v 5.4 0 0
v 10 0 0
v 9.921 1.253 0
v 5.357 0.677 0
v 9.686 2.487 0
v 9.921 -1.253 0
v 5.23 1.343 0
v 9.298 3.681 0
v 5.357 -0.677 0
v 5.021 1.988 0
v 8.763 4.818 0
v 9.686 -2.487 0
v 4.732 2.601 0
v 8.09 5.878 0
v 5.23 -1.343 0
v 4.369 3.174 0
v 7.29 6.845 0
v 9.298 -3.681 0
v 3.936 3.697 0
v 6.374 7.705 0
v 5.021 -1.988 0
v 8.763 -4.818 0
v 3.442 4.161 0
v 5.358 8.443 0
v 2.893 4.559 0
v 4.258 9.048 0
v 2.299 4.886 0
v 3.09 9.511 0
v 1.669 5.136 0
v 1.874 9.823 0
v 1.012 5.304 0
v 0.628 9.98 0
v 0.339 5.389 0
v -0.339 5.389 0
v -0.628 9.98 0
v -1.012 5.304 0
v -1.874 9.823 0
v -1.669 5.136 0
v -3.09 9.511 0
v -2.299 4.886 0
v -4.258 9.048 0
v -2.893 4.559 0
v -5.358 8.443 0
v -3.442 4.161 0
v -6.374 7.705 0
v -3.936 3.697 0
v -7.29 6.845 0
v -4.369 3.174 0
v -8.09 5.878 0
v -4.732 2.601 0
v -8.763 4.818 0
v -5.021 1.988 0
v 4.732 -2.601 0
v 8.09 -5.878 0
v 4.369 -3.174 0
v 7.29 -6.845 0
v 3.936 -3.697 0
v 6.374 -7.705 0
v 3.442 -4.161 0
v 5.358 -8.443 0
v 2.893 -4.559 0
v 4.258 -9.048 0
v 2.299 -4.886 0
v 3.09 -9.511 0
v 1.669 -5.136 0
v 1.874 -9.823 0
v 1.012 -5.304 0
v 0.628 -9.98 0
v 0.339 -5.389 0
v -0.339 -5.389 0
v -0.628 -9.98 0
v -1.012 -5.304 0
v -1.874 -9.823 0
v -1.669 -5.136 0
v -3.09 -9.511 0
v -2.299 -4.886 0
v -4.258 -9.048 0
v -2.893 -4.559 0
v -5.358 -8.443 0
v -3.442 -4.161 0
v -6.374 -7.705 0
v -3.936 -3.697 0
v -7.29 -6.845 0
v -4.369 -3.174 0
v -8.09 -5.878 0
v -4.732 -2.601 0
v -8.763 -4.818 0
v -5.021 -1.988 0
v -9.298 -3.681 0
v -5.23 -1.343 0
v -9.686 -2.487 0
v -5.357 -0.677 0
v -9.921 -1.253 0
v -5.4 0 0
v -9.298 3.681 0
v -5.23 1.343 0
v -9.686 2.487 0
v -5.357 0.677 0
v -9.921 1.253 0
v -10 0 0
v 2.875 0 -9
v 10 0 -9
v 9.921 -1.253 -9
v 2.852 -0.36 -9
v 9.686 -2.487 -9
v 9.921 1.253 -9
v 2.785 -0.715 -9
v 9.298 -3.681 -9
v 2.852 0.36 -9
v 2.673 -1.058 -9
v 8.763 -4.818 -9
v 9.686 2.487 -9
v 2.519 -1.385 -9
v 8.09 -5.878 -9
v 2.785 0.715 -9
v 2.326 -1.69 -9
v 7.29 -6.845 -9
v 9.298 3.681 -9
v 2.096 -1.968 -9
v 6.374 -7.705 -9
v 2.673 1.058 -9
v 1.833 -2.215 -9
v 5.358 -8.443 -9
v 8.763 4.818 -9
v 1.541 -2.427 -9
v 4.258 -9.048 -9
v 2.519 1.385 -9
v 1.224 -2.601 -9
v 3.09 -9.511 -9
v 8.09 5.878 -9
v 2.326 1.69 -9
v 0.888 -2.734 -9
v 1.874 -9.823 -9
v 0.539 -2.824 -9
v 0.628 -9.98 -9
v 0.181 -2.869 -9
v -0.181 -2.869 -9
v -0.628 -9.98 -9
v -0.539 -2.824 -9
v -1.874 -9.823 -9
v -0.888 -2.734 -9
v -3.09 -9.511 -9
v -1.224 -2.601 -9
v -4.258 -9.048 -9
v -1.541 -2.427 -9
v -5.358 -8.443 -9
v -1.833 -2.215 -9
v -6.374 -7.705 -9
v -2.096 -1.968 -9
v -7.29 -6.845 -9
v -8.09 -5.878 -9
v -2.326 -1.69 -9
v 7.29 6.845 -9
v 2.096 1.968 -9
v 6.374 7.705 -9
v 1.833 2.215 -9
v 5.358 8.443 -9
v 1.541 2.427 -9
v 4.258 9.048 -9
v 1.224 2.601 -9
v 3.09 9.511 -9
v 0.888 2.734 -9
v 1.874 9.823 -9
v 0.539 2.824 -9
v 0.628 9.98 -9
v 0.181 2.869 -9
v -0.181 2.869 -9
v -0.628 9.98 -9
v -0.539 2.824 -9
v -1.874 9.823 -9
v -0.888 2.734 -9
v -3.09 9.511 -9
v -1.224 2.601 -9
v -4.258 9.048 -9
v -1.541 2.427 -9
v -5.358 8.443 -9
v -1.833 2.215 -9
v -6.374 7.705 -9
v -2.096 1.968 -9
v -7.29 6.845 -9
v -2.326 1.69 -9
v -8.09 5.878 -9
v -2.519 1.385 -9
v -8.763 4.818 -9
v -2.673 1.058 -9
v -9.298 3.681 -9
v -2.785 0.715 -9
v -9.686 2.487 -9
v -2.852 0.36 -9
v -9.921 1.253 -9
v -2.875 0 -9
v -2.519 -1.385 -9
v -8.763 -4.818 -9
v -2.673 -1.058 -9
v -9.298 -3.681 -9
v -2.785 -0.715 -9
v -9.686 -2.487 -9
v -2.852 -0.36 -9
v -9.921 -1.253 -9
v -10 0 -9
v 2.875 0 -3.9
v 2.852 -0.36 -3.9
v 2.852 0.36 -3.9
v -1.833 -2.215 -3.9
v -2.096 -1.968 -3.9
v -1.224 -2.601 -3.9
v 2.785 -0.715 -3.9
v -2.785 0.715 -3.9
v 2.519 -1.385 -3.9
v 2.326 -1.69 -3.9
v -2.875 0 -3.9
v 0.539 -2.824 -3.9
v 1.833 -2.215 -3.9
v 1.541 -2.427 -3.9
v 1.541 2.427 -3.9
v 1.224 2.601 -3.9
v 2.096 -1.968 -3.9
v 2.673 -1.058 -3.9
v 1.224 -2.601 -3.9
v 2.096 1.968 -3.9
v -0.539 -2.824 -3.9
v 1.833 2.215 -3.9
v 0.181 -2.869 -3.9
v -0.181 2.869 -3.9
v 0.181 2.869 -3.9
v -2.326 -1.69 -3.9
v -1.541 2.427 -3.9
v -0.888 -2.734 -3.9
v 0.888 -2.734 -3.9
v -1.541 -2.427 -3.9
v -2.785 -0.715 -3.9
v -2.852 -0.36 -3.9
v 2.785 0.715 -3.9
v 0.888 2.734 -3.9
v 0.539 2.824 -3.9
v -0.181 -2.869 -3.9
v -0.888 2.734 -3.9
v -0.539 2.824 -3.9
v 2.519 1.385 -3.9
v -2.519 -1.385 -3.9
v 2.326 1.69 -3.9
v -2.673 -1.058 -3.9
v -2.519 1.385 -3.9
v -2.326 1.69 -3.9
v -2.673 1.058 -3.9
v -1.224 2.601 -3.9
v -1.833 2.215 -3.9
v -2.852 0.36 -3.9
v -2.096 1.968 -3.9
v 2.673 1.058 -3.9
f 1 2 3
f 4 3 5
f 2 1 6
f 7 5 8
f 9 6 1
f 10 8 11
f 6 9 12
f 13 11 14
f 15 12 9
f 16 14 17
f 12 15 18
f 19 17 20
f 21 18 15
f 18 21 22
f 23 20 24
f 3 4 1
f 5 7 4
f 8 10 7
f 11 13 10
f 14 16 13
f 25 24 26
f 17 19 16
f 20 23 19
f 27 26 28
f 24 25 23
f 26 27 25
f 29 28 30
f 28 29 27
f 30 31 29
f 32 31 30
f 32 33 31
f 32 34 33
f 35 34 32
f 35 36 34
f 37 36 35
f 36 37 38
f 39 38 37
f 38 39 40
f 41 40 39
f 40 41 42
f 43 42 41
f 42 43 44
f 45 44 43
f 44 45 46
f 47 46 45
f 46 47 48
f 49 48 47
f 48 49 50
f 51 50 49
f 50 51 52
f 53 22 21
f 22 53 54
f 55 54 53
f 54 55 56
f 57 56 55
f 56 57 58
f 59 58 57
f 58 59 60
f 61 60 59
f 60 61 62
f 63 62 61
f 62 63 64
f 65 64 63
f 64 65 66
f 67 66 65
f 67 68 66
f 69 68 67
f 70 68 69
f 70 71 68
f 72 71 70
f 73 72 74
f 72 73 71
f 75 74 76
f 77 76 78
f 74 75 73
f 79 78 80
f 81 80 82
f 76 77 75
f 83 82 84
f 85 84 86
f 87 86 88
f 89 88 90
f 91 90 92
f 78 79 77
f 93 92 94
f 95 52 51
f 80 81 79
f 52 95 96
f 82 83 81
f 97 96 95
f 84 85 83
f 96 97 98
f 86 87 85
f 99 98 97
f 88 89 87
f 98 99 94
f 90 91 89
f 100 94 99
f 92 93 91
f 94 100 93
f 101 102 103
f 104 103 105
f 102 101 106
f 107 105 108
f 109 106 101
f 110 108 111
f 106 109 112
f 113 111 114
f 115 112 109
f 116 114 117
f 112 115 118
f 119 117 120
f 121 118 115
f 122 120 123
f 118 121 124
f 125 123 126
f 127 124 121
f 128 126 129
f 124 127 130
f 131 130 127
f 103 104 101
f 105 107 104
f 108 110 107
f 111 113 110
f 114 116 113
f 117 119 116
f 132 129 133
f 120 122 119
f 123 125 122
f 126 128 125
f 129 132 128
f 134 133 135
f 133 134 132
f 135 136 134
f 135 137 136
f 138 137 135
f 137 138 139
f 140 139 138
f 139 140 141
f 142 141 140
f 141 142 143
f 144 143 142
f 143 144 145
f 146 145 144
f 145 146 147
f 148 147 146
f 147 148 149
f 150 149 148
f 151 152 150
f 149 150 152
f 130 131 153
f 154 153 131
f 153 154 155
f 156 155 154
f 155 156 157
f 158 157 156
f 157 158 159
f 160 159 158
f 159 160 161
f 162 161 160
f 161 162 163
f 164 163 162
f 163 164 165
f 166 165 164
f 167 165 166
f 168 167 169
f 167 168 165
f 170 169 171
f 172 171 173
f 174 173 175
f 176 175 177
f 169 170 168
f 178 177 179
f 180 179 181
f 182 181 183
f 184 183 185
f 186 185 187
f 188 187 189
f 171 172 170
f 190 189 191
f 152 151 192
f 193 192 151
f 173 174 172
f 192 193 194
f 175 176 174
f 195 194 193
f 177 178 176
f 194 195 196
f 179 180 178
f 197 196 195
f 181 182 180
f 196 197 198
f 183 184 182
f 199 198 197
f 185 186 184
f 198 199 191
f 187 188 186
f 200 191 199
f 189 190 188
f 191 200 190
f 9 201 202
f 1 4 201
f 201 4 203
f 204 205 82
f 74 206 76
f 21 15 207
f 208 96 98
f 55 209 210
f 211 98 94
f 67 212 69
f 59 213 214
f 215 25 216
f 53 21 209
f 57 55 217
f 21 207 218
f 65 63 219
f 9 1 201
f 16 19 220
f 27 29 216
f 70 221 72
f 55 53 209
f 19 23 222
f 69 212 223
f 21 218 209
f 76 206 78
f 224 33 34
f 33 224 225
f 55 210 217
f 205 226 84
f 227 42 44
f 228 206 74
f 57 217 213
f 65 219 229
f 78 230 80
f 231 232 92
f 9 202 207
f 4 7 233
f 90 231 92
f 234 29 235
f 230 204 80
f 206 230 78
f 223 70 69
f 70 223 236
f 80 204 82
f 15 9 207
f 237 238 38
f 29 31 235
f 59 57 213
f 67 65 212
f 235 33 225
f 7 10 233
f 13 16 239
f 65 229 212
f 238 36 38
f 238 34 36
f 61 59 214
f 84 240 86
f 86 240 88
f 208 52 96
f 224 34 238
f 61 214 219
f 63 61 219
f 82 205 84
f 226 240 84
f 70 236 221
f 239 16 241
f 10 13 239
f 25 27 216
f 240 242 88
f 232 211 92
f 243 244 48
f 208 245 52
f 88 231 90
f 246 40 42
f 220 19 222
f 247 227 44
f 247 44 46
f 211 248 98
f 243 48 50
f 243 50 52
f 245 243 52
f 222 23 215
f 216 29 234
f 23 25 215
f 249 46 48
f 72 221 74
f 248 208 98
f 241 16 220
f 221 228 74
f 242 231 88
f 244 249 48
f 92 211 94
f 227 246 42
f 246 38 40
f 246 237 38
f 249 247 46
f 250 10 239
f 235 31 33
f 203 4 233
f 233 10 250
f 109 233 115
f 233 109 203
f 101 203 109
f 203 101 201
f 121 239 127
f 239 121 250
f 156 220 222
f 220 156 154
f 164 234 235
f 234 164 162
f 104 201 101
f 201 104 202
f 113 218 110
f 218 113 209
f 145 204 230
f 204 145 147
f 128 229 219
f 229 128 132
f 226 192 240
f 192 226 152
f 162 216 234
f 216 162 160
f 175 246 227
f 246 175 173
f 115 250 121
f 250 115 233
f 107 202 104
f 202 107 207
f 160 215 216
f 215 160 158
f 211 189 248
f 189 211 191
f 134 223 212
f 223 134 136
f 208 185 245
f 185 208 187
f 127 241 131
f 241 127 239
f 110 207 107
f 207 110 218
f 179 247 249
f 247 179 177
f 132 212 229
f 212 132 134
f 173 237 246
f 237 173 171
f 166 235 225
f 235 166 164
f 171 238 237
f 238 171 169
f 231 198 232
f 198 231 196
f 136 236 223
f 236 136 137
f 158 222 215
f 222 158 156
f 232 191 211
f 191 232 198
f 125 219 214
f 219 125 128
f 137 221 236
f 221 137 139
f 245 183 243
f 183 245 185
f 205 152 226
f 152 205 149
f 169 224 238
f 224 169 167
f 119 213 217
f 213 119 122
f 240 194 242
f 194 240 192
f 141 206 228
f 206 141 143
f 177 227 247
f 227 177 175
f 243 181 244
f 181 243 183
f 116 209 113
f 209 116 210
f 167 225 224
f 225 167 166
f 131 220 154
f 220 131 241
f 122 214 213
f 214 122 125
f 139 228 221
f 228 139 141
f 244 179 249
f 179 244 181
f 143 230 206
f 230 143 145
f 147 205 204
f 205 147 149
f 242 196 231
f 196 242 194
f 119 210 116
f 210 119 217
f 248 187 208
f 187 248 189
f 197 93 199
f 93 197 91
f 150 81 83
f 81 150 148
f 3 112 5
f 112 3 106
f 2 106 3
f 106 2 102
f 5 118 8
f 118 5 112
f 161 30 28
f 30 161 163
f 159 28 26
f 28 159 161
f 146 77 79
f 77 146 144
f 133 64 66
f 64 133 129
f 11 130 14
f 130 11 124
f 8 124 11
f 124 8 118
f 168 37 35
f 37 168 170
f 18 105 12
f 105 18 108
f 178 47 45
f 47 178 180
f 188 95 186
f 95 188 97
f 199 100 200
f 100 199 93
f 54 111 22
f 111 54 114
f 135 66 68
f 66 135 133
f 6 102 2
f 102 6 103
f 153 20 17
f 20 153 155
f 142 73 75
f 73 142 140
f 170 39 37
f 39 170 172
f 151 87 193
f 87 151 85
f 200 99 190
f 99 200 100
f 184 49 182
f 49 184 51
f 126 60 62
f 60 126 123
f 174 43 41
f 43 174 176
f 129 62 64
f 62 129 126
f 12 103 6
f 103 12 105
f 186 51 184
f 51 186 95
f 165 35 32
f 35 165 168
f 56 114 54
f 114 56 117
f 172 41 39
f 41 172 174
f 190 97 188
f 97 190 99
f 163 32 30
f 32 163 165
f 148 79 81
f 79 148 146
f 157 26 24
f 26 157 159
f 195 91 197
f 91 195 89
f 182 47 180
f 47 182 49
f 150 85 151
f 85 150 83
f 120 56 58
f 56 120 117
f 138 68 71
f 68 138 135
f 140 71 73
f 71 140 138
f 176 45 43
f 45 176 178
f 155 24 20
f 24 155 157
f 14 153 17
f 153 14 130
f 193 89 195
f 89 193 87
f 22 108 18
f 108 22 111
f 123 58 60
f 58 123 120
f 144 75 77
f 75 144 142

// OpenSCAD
$fn = 50;


difference() {
	union() {
		translate(v = [0, 0, -9.0000000000]) {
			cylinder(h = 9, r = 10.0000000000);
		}
		cylinder(h = 0, r = 13.0000000000);
	}
	union() {
		translate(v = [0, 0, 0]) {
			rotate(a = [0, 0, 0]) {
				difference() {
					union() {
						#translate(v = [0, 0, -9.0000000000]) {
							cylinder(h = 9, r = 2.6000000000);
						}
						#translate(v = [0, 0, -3.9000000000]) {
							cylinder(h = 3.9000000000, r = 10.0000000000, r1 = 2.8750000000, r2 = 5.4000000000);
						}
						#translate(v = [0, 0, -9.0000000000]) {
							cylinder(h = 9, r = 2.8750000000);
						}
						#translate(v = [0, 0, -9.0000000000]) {
							cylinder(h = 9, r = 2.6000000000);
						}
					}
					union();
				}
			}
		}
	}
}
